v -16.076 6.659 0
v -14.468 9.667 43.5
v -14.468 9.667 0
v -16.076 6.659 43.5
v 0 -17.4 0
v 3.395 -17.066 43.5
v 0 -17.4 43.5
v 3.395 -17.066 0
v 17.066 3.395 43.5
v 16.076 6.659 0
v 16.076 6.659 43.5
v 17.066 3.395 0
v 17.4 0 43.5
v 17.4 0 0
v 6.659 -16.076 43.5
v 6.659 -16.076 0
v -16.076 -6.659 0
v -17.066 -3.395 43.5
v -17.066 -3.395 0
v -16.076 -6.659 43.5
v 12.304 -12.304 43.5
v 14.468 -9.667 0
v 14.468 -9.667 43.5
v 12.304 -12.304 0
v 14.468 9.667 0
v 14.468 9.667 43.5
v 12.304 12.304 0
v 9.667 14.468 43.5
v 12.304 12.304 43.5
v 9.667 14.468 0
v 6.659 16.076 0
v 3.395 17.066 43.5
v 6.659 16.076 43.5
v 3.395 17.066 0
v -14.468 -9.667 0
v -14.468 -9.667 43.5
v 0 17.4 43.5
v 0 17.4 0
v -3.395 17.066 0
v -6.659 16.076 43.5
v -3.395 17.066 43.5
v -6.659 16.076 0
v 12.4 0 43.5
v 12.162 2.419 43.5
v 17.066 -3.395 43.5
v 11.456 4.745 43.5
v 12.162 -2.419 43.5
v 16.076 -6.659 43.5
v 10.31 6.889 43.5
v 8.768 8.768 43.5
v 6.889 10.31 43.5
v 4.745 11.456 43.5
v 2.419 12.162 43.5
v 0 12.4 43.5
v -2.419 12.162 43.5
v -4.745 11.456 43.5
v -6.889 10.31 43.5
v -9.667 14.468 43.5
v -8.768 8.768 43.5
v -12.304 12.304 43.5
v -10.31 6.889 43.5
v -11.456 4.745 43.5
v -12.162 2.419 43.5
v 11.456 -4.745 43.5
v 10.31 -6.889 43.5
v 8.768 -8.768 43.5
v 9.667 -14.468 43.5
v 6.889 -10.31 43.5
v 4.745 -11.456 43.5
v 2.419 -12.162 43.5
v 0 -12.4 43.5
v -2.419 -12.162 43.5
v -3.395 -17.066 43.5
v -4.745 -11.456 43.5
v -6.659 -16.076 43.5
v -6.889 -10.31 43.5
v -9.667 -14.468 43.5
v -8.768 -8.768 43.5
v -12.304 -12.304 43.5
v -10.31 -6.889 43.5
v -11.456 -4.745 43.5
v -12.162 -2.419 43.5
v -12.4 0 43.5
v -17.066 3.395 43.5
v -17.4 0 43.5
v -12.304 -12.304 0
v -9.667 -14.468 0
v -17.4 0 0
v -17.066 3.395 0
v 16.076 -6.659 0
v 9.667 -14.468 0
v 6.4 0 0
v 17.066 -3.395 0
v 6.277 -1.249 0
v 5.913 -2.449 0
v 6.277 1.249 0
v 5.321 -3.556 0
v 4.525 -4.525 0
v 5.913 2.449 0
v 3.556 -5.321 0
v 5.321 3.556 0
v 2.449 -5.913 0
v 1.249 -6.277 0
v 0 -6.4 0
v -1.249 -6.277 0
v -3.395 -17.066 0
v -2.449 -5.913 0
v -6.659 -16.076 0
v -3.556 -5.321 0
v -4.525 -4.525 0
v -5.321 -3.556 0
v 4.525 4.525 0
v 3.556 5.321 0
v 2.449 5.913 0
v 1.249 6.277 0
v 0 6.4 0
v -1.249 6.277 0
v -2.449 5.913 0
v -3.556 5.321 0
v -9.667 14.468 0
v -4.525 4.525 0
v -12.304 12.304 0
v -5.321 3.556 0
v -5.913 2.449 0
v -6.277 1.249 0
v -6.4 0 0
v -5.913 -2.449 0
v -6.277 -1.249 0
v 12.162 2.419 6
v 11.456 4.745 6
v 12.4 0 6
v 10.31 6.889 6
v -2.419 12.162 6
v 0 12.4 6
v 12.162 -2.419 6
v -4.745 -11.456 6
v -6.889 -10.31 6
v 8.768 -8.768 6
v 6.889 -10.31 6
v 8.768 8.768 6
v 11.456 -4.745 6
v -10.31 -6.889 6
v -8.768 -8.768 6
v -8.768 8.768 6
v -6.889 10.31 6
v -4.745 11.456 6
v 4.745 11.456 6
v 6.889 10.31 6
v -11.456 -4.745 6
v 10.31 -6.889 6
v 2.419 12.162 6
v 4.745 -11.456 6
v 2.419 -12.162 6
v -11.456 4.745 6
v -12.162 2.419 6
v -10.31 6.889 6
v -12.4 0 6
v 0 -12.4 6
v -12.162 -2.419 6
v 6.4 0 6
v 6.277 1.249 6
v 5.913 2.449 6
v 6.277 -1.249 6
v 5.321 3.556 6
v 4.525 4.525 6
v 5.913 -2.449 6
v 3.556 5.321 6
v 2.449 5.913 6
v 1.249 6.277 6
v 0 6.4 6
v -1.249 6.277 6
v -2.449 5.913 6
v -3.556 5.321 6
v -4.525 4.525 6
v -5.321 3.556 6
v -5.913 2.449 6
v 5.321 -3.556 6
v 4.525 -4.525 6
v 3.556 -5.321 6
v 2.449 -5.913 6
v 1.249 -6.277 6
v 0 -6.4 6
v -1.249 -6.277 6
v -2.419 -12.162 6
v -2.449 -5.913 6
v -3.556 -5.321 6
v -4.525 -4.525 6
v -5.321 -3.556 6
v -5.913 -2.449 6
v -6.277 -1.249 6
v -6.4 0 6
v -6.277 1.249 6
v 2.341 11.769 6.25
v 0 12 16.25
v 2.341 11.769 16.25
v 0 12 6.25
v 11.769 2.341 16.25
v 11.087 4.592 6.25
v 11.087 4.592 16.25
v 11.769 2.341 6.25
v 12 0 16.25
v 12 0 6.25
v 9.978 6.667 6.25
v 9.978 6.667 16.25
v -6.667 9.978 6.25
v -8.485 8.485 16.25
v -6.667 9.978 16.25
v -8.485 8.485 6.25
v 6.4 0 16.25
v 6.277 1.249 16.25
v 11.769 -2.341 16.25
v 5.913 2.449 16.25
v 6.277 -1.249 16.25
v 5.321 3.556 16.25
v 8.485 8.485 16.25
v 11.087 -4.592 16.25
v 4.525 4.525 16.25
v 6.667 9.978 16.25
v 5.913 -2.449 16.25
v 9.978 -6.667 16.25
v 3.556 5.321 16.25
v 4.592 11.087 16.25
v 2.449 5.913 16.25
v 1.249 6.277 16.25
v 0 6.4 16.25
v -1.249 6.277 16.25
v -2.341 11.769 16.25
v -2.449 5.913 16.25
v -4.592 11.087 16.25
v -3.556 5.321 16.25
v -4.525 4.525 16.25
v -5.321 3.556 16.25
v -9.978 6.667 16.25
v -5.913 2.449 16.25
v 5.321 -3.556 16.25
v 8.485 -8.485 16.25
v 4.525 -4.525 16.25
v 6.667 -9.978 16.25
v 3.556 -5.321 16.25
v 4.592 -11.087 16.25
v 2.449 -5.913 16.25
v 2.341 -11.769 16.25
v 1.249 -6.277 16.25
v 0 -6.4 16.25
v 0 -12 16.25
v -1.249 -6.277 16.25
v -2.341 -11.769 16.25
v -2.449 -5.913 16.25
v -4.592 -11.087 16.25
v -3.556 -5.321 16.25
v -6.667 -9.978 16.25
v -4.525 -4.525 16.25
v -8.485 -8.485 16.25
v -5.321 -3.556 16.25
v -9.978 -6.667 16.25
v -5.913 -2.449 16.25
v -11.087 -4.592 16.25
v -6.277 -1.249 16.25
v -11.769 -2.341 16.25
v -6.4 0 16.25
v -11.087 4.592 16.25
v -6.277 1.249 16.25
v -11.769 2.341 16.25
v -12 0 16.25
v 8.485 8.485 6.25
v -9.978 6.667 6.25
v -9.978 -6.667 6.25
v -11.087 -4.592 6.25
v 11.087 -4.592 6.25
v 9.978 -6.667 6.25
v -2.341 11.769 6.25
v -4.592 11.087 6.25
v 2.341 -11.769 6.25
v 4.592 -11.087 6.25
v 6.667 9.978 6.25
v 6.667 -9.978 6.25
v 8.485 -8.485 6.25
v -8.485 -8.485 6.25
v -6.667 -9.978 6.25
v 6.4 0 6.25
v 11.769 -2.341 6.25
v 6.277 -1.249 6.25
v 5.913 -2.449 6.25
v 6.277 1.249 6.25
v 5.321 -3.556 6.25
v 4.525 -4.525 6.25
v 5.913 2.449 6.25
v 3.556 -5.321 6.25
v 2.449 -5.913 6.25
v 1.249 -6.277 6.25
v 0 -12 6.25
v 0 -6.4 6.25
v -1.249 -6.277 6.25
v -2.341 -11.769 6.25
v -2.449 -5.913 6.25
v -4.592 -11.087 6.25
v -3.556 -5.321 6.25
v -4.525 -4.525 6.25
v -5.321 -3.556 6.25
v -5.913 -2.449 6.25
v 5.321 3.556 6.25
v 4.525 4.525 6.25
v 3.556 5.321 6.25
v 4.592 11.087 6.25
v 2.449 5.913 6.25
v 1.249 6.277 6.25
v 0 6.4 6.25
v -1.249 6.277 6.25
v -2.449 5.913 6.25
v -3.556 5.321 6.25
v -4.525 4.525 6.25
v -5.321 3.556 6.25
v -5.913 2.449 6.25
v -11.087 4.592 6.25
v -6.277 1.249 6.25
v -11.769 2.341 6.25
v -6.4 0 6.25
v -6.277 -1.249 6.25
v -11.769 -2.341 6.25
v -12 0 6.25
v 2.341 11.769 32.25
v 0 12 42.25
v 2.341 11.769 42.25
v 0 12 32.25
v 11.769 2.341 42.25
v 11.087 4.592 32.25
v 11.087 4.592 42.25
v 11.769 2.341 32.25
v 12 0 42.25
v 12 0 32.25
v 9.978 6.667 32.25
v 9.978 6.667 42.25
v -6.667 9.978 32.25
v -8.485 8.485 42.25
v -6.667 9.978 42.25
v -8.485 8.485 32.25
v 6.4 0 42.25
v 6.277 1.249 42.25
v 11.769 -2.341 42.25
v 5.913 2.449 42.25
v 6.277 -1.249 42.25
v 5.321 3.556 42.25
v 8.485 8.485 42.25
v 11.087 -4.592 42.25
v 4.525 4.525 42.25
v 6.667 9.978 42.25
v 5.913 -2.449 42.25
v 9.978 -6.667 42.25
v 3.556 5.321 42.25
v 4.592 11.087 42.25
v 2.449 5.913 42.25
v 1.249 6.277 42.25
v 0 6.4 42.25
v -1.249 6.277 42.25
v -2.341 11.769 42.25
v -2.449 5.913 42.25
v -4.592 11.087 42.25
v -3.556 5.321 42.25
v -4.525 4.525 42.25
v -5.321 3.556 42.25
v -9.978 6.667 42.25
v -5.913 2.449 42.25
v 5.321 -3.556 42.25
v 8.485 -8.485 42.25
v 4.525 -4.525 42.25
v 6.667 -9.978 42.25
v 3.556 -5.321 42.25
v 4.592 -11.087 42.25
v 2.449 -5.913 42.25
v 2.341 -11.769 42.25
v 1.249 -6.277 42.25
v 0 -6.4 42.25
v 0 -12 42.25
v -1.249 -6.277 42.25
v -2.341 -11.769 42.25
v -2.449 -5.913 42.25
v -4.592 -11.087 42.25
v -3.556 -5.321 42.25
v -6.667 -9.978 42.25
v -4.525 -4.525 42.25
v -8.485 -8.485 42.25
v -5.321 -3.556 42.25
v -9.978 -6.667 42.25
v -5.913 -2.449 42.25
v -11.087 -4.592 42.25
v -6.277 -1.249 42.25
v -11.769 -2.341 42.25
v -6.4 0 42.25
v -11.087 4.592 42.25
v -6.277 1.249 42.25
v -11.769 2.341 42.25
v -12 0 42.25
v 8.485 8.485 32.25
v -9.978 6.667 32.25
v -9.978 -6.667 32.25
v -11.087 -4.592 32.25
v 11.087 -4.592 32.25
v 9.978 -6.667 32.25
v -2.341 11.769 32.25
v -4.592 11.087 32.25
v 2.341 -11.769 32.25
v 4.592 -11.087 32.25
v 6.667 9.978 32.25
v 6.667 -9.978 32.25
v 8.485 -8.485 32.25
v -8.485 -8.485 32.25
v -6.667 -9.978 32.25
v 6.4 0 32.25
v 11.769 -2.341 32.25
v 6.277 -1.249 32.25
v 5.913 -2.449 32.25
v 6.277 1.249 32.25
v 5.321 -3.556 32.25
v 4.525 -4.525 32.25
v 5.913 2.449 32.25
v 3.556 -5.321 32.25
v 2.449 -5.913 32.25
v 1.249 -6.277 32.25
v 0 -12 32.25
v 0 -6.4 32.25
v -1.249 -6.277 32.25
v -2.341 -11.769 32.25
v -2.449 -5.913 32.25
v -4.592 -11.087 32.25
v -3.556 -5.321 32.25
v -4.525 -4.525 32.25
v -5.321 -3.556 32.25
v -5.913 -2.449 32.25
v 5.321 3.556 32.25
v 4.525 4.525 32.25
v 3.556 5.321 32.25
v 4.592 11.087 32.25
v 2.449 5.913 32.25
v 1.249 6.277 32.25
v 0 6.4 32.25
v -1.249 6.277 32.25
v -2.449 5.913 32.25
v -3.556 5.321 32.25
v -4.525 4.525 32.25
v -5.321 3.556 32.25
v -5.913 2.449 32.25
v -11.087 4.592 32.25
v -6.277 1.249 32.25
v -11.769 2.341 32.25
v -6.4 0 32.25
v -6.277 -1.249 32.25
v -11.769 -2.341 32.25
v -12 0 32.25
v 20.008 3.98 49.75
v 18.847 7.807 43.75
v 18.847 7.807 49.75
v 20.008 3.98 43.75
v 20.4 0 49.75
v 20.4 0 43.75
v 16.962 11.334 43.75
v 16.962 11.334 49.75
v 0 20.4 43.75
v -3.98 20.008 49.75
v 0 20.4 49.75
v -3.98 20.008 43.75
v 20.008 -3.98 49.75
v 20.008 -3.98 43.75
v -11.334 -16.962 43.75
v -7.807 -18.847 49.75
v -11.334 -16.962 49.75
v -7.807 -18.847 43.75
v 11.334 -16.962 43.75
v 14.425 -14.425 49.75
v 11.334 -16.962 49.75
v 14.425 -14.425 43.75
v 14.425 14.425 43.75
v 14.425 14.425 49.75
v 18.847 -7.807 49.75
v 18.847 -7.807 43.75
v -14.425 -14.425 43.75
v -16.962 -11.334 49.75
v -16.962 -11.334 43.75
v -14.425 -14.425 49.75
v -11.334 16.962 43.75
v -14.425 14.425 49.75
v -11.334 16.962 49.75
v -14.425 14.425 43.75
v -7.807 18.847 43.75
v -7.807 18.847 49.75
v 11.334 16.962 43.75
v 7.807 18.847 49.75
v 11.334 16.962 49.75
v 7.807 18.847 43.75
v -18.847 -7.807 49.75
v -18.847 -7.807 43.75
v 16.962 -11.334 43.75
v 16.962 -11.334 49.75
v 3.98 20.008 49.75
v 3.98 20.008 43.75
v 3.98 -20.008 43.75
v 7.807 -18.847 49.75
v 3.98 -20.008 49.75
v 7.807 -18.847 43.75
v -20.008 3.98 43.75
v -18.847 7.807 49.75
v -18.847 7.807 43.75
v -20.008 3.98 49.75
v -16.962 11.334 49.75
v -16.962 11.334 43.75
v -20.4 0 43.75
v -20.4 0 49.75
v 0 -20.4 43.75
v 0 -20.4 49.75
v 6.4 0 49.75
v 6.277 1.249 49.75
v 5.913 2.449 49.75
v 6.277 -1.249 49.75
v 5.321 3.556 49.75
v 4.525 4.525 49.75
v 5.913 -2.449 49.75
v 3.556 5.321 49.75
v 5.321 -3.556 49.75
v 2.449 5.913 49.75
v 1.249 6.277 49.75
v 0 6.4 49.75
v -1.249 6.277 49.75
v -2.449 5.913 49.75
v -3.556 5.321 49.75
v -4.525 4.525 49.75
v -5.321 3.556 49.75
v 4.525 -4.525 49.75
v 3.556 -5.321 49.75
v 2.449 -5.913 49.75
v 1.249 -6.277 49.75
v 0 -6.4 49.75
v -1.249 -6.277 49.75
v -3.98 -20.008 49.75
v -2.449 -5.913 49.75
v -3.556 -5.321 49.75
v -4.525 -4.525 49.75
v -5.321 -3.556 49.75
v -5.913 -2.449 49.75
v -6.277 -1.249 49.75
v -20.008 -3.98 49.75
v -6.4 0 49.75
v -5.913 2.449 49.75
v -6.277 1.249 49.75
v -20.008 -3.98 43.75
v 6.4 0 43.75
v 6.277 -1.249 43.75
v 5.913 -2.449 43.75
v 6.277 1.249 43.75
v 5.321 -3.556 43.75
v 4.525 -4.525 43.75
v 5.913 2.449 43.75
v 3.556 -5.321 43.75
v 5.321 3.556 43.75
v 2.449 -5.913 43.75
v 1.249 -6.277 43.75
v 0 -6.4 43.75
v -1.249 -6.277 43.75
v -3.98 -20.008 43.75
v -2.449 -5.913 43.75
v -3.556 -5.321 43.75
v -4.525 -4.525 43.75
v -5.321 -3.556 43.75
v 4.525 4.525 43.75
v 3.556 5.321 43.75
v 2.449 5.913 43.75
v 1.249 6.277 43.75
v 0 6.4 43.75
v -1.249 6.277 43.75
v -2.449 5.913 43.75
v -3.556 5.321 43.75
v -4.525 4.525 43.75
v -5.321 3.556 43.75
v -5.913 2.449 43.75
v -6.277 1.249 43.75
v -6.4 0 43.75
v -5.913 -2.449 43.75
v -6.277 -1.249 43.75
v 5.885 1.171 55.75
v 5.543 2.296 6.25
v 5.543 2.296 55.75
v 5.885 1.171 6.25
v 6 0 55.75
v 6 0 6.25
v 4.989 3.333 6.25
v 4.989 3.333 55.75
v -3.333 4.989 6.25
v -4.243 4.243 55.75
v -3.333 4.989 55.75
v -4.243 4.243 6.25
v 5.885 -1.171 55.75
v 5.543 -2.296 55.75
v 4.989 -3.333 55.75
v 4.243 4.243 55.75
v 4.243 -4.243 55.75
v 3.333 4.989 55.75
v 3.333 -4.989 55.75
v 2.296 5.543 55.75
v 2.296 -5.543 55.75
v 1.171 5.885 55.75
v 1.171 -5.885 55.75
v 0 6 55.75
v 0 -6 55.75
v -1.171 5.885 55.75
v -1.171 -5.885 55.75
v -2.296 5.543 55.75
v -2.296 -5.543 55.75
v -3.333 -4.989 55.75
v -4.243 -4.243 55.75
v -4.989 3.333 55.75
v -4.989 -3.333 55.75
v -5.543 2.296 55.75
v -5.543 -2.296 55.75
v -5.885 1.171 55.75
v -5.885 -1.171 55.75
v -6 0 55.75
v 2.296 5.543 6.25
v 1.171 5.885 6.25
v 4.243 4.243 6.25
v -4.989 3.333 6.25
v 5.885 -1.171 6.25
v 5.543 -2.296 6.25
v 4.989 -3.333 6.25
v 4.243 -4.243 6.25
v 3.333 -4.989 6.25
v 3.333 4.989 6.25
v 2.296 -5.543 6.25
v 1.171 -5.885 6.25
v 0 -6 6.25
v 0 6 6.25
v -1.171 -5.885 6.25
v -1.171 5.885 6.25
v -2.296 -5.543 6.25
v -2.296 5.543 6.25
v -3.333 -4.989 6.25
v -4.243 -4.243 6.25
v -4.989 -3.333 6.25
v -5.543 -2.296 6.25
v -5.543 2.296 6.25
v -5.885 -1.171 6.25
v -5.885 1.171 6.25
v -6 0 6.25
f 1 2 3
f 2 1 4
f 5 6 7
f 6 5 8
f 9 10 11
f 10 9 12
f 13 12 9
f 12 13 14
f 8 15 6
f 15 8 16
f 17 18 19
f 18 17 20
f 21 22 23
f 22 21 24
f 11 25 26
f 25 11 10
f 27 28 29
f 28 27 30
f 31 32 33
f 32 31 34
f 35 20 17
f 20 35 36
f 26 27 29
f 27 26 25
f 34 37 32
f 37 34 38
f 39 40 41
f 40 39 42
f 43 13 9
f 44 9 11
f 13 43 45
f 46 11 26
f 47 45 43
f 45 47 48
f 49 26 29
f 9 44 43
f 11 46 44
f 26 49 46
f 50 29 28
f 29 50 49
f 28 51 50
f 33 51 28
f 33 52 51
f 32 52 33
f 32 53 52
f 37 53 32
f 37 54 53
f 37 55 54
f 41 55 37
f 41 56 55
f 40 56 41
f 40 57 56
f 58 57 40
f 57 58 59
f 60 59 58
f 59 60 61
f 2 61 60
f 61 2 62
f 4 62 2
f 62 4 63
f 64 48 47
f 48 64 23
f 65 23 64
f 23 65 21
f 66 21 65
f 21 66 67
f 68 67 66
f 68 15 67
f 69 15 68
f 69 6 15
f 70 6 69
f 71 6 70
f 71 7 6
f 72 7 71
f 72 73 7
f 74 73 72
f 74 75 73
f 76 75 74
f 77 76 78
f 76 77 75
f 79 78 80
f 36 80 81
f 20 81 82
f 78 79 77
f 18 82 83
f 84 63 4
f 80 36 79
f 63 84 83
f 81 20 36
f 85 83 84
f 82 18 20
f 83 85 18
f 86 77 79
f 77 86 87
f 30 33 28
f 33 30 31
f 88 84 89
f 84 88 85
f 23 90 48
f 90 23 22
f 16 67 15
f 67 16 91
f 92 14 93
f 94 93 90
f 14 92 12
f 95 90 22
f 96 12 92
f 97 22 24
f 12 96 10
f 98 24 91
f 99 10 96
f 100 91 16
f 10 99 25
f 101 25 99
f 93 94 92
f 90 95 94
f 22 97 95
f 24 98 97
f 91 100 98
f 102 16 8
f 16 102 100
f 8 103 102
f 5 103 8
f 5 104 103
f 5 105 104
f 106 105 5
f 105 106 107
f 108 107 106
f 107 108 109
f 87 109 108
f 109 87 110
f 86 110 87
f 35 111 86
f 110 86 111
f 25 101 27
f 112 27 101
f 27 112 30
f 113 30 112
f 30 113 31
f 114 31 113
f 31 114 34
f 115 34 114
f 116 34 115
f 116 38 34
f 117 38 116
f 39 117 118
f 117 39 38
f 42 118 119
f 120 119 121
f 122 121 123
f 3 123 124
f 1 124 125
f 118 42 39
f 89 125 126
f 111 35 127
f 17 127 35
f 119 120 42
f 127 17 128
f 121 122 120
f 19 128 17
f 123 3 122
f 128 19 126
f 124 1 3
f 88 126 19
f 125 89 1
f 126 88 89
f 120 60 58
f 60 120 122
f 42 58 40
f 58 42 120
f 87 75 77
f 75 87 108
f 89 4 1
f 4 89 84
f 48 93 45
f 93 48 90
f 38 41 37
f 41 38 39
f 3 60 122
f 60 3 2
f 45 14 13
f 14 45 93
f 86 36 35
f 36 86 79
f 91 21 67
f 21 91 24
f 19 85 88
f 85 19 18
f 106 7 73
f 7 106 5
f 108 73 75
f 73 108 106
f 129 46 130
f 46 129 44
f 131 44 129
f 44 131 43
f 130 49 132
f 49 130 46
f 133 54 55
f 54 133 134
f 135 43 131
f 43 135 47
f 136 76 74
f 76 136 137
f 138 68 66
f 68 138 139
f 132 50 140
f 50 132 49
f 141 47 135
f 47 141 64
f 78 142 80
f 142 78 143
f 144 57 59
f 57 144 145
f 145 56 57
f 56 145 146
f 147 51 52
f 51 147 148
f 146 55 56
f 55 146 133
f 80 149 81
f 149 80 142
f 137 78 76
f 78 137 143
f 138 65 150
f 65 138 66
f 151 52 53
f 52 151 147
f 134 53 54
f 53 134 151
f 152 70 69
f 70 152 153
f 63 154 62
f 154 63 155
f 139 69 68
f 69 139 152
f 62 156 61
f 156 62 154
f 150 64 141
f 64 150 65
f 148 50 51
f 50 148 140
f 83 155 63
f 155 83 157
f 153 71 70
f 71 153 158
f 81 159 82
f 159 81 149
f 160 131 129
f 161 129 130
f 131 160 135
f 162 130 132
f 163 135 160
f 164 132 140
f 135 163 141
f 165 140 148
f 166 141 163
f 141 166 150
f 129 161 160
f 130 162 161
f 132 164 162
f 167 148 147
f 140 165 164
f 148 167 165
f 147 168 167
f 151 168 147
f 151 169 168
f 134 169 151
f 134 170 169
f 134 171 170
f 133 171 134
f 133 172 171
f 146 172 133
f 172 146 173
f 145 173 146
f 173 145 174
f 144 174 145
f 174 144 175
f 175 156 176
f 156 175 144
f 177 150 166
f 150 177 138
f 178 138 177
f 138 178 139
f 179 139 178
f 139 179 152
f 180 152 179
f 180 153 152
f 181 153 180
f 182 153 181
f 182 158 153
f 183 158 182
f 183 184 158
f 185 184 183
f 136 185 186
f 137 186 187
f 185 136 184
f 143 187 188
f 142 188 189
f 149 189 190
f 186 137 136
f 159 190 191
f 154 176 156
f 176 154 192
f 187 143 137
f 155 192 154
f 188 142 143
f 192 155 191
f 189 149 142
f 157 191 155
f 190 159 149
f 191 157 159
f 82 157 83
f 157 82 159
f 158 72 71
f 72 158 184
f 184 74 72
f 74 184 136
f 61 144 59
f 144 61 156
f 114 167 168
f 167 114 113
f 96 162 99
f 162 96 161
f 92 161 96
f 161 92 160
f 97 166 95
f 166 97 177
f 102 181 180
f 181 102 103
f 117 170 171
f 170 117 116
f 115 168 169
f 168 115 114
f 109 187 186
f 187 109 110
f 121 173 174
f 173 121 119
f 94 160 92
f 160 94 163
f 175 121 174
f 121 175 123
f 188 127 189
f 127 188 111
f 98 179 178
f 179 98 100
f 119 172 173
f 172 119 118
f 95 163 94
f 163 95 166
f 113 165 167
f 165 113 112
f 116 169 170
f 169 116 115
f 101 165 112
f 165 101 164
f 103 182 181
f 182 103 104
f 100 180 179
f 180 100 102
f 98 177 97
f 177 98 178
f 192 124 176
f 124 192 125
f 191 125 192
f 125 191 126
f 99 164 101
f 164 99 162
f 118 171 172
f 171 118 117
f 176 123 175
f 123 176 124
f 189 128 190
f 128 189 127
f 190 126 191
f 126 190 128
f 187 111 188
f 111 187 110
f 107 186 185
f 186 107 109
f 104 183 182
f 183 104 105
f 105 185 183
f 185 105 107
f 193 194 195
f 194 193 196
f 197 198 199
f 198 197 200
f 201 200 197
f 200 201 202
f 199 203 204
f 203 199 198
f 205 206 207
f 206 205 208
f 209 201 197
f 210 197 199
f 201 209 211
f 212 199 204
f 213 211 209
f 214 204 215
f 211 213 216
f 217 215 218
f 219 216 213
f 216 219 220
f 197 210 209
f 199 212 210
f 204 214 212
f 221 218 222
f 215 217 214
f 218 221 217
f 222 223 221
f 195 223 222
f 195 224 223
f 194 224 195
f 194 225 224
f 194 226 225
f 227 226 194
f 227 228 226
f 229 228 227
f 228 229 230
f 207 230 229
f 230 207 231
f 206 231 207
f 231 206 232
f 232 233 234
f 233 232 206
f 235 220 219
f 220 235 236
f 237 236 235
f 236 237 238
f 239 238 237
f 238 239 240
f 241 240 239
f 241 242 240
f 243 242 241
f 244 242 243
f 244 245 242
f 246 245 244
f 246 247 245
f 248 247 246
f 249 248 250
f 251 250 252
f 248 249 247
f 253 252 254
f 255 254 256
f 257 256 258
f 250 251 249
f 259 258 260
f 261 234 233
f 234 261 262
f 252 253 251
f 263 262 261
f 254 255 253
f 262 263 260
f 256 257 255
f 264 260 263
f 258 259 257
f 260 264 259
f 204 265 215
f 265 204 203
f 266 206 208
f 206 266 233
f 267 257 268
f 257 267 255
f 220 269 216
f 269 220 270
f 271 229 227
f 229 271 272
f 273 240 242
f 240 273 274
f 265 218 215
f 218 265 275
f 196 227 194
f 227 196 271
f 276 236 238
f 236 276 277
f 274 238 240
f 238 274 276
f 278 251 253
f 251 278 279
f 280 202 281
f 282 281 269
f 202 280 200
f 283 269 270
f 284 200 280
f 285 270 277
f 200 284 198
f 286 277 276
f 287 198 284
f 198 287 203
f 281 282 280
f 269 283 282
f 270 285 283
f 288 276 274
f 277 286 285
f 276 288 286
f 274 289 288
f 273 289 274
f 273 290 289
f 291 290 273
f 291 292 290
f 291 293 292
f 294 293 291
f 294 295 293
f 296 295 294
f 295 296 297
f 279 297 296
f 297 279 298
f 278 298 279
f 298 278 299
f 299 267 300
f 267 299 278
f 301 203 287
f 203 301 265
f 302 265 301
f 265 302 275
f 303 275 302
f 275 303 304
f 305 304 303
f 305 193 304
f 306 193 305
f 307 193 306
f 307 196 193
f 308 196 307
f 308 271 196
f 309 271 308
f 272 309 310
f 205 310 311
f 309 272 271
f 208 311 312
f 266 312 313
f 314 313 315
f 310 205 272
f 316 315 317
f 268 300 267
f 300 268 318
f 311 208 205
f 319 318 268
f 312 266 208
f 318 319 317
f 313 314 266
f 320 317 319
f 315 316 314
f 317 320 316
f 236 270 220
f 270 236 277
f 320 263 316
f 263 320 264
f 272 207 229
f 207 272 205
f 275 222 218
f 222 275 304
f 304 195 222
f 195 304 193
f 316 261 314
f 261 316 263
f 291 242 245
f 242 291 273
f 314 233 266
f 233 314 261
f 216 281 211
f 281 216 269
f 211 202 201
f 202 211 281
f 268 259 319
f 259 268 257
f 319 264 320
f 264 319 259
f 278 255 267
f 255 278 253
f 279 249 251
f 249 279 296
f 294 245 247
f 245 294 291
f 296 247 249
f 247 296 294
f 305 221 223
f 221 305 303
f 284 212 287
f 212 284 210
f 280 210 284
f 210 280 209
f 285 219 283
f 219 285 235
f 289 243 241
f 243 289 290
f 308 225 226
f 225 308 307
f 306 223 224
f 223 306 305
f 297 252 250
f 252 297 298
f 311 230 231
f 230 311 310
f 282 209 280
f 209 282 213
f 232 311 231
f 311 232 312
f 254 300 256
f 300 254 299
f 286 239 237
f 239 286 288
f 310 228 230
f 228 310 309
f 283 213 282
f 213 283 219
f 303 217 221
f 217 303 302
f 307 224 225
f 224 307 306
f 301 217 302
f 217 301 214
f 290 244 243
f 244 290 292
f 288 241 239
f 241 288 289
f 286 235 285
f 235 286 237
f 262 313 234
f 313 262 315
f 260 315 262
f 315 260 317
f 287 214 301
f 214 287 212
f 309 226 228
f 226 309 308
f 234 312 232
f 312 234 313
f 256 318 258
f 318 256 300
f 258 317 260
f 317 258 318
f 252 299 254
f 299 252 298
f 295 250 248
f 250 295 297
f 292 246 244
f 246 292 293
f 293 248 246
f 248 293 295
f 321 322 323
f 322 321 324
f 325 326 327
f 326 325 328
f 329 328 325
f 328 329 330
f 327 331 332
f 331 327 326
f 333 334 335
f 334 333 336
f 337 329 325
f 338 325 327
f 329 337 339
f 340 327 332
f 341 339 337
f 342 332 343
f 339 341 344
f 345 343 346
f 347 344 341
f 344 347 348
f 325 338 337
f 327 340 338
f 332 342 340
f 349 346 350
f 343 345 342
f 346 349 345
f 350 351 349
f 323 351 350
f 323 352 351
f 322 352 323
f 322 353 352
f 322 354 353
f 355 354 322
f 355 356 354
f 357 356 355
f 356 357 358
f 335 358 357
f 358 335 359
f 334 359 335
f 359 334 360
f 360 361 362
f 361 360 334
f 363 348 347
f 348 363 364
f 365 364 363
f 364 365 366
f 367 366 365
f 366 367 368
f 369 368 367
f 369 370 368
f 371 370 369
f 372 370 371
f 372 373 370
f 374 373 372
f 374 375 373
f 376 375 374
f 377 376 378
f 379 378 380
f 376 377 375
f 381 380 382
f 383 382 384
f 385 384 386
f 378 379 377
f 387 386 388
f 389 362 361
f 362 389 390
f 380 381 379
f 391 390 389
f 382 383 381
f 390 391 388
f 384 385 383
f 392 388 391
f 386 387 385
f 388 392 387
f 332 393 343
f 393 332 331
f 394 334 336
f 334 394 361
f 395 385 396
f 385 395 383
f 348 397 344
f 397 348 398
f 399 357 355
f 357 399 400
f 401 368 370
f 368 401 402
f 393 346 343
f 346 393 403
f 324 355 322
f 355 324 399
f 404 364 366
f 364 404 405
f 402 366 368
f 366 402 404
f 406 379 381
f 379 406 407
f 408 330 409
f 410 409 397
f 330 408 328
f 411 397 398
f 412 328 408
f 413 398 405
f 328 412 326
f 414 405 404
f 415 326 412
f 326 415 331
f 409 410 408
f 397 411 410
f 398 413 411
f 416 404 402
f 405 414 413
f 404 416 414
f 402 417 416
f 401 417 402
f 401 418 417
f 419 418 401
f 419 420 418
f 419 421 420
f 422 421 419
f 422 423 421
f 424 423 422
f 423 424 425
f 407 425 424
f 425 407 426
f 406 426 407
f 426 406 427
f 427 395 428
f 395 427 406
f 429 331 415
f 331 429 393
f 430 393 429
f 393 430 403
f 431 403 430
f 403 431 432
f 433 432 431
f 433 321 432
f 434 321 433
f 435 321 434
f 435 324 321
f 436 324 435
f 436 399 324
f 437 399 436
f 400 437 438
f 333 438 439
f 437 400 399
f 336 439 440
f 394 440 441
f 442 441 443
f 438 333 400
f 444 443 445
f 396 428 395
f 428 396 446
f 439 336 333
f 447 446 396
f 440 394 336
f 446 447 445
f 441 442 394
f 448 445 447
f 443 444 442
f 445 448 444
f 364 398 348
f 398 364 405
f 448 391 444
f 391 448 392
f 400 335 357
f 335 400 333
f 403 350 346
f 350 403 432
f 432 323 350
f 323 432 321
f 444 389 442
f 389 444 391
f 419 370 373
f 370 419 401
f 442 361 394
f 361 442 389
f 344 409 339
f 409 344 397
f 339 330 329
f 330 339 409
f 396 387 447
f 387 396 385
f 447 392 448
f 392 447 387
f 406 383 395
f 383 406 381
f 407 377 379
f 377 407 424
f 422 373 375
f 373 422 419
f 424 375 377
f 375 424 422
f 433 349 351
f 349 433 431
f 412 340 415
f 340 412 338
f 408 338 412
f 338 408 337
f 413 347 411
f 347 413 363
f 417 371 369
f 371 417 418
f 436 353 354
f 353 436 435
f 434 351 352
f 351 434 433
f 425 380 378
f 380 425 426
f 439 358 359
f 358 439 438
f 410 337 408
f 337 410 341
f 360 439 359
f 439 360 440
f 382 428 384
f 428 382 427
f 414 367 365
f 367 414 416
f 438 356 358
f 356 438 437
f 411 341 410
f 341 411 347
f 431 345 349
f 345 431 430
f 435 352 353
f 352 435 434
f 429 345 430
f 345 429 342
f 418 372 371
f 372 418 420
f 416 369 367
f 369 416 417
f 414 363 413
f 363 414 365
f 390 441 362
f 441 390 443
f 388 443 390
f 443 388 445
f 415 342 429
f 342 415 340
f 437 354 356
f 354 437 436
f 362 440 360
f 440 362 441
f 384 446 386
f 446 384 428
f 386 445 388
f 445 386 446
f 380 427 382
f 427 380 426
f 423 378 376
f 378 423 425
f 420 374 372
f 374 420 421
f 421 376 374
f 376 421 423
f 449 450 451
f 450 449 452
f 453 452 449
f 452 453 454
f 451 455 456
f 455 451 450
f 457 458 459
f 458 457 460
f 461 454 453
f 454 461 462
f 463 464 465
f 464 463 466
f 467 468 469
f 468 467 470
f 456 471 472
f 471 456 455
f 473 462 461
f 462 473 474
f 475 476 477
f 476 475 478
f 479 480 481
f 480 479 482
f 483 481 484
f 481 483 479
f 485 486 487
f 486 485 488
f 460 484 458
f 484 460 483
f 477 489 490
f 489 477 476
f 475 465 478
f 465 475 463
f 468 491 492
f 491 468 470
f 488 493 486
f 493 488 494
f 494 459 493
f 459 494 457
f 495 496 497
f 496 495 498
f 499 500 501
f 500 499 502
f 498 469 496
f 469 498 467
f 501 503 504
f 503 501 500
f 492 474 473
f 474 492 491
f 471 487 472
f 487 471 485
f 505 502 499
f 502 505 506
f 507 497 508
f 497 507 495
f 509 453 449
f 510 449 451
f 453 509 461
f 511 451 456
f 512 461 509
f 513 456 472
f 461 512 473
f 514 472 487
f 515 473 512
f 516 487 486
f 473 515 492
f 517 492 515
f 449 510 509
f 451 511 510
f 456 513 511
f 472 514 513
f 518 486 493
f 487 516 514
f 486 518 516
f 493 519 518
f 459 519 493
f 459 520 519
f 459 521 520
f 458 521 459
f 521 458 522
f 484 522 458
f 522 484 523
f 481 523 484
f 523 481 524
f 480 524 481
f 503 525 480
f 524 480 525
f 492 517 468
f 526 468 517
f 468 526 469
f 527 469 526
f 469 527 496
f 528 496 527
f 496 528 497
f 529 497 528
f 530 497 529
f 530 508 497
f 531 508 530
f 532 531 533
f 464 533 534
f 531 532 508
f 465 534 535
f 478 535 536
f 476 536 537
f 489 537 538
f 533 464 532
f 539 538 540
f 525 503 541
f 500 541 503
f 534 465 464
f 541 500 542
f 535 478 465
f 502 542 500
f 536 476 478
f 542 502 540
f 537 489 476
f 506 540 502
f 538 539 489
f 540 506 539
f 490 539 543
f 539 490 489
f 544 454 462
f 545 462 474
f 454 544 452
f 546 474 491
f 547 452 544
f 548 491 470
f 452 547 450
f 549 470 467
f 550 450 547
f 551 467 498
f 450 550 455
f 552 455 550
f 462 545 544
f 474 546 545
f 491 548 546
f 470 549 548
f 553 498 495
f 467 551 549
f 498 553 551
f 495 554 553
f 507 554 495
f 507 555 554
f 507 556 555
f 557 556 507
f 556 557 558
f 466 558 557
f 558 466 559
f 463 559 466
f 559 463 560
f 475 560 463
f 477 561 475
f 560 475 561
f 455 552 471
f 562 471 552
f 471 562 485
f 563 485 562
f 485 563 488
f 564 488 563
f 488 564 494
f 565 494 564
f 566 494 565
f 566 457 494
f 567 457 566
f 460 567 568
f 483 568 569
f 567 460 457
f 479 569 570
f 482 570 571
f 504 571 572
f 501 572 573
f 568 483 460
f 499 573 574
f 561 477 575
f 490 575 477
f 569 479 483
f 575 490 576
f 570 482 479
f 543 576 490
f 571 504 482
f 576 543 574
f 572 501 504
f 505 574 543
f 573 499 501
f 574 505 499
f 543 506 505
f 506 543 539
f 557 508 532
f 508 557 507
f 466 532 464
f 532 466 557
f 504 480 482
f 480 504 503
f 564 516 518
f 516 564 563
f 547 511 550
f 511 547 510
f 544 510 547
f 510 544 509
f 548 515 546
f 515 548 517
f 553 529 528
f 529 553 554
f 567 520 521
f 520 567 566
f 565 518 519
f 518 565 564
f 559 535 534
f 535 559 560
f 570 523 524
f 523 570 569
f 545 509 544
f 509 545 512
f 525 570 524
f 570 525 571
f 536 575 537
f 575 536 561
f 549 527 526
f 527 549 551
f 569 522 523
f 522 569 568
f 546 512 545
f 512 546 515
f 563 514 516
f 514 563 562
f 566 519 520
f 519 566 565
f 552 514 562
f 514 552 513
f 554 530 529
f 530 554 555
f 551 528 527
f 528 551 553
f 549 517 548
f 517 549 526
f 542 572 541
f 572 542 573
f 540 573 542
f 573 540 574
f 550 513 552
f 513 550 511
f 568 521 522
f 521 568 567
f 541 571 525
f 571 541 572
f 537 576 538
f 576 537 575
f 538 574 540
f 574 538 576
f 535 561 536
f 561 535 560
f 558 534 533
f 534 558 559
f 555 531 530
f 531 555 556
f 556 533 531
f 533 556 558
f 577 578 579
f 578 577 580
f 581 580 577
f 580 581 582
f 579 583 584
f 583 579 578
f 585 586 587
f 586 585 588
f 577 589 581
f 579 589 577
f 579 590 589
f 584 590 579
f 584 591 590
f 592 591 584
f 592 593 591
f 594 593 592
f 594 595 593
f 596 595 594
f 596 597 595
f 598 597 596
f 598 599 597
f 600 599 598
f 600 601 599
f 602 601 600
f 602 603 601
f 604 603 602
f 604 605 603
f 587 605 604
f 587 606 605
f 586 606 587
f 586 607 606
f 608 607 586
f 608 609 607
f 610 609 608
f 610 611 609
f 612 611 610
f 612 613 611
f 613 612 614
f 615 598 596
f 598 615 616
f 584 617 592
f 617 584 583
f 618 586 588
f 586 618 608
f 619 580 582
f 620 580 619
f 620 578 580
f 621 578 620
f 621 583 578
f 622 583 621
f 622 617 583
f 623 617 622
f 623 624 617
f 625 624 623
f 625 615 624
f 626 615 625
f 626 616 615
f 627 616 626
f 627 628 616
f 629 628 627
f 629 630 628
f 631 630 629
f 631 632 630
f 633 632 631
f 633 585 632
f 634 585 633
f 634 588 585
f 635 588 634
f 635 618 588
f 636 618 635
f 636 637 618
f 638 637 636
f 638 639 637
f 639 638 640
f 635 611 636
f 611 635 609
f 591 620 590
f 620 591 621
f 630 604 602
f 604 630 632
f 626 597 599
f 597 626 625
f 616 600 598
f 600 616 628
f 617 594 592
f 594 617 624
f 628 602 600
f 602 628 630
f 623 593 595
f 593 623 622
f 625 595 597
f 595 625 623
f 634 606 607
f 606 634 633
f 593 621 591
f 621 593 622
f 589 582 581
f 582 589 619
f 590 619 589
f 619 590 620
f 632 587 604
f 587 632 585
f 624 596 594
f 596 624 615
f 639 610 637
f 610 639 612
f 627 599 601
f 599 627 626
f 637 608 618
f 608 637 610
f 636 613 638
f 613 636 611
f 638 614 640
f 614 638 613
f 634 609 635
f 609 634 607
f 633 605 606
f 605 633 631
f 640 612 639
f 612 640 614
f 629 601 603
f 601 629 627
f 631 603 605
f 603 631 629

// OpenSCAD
$fn = 32;

// ------------------------------------------------------------------------
// Shaft station: cup d34.8 x 43.5 mm, shaft d12
// Every part is its own module, assembly() places every instance.
// ------------------------------------------------------------------------

// --- part 1 ---
module housing_cup() {
  difference() {
    cylinder(h = 43.5, d = 34.8);
    translate([0, 0, 6]) cylinder(h = 38.5, d = 24.8);
    translate([0, 0, -1]) cylinder(h = 8, d = 12.8);
  }
}

// --- part 2 ---
module bearing_lower() {
  difference() {
      translate([0, 0, 0]) cylinder(h = 10, d = 24);
      translate([0, 0, -1]) cylinder(h = 12, d = 12.8);
    }
}

// --- part 3 ---
module bearing_upper() {
  difference() {
      translate([0, 0, 0]) cylinder(h = 10, d = 24);
      translate([0, 0, -1]) cylinder(h = 12, d = 12.8);
    }
}

// --- part 4 ---
module station_shaft() {
  translate([0, 0, -24.75]) cylinder(h = 49.5, d = 12);
}

// --- part 5 ---
module station_cover() {
  difference() {
    cylinder(h = 6, d = 40.8);
    translate([0, 0, -1]) cylinder(h = 8, d = 12.8);
  }
}

// --- assembly ---
module assembly() {
  color([0.80, 0.24, 0.20]) translate([0, 0, 0]) rotate([0, 0, 0]) housing_cup();
  color([0.20, 0.45, 0.75]) translate([0, 0, 6.25]) rotate([0, 0, 0]) bearing_lower();
  color([0.25, 0.62, 0.32]) translate([0, 0, 32.25]) rotate([0, 0, 0]) bearing_upper();
  color([0.92, 0.70, 0.18]) translate([0, 0, 31]) rotate([0, 0, 0]) station_shaft();
  color([0.58, 0.35, 0.70]) translate([0, 0, 43.75]) rotate([0, 0, 0]) station_cover();
}

assembly();
